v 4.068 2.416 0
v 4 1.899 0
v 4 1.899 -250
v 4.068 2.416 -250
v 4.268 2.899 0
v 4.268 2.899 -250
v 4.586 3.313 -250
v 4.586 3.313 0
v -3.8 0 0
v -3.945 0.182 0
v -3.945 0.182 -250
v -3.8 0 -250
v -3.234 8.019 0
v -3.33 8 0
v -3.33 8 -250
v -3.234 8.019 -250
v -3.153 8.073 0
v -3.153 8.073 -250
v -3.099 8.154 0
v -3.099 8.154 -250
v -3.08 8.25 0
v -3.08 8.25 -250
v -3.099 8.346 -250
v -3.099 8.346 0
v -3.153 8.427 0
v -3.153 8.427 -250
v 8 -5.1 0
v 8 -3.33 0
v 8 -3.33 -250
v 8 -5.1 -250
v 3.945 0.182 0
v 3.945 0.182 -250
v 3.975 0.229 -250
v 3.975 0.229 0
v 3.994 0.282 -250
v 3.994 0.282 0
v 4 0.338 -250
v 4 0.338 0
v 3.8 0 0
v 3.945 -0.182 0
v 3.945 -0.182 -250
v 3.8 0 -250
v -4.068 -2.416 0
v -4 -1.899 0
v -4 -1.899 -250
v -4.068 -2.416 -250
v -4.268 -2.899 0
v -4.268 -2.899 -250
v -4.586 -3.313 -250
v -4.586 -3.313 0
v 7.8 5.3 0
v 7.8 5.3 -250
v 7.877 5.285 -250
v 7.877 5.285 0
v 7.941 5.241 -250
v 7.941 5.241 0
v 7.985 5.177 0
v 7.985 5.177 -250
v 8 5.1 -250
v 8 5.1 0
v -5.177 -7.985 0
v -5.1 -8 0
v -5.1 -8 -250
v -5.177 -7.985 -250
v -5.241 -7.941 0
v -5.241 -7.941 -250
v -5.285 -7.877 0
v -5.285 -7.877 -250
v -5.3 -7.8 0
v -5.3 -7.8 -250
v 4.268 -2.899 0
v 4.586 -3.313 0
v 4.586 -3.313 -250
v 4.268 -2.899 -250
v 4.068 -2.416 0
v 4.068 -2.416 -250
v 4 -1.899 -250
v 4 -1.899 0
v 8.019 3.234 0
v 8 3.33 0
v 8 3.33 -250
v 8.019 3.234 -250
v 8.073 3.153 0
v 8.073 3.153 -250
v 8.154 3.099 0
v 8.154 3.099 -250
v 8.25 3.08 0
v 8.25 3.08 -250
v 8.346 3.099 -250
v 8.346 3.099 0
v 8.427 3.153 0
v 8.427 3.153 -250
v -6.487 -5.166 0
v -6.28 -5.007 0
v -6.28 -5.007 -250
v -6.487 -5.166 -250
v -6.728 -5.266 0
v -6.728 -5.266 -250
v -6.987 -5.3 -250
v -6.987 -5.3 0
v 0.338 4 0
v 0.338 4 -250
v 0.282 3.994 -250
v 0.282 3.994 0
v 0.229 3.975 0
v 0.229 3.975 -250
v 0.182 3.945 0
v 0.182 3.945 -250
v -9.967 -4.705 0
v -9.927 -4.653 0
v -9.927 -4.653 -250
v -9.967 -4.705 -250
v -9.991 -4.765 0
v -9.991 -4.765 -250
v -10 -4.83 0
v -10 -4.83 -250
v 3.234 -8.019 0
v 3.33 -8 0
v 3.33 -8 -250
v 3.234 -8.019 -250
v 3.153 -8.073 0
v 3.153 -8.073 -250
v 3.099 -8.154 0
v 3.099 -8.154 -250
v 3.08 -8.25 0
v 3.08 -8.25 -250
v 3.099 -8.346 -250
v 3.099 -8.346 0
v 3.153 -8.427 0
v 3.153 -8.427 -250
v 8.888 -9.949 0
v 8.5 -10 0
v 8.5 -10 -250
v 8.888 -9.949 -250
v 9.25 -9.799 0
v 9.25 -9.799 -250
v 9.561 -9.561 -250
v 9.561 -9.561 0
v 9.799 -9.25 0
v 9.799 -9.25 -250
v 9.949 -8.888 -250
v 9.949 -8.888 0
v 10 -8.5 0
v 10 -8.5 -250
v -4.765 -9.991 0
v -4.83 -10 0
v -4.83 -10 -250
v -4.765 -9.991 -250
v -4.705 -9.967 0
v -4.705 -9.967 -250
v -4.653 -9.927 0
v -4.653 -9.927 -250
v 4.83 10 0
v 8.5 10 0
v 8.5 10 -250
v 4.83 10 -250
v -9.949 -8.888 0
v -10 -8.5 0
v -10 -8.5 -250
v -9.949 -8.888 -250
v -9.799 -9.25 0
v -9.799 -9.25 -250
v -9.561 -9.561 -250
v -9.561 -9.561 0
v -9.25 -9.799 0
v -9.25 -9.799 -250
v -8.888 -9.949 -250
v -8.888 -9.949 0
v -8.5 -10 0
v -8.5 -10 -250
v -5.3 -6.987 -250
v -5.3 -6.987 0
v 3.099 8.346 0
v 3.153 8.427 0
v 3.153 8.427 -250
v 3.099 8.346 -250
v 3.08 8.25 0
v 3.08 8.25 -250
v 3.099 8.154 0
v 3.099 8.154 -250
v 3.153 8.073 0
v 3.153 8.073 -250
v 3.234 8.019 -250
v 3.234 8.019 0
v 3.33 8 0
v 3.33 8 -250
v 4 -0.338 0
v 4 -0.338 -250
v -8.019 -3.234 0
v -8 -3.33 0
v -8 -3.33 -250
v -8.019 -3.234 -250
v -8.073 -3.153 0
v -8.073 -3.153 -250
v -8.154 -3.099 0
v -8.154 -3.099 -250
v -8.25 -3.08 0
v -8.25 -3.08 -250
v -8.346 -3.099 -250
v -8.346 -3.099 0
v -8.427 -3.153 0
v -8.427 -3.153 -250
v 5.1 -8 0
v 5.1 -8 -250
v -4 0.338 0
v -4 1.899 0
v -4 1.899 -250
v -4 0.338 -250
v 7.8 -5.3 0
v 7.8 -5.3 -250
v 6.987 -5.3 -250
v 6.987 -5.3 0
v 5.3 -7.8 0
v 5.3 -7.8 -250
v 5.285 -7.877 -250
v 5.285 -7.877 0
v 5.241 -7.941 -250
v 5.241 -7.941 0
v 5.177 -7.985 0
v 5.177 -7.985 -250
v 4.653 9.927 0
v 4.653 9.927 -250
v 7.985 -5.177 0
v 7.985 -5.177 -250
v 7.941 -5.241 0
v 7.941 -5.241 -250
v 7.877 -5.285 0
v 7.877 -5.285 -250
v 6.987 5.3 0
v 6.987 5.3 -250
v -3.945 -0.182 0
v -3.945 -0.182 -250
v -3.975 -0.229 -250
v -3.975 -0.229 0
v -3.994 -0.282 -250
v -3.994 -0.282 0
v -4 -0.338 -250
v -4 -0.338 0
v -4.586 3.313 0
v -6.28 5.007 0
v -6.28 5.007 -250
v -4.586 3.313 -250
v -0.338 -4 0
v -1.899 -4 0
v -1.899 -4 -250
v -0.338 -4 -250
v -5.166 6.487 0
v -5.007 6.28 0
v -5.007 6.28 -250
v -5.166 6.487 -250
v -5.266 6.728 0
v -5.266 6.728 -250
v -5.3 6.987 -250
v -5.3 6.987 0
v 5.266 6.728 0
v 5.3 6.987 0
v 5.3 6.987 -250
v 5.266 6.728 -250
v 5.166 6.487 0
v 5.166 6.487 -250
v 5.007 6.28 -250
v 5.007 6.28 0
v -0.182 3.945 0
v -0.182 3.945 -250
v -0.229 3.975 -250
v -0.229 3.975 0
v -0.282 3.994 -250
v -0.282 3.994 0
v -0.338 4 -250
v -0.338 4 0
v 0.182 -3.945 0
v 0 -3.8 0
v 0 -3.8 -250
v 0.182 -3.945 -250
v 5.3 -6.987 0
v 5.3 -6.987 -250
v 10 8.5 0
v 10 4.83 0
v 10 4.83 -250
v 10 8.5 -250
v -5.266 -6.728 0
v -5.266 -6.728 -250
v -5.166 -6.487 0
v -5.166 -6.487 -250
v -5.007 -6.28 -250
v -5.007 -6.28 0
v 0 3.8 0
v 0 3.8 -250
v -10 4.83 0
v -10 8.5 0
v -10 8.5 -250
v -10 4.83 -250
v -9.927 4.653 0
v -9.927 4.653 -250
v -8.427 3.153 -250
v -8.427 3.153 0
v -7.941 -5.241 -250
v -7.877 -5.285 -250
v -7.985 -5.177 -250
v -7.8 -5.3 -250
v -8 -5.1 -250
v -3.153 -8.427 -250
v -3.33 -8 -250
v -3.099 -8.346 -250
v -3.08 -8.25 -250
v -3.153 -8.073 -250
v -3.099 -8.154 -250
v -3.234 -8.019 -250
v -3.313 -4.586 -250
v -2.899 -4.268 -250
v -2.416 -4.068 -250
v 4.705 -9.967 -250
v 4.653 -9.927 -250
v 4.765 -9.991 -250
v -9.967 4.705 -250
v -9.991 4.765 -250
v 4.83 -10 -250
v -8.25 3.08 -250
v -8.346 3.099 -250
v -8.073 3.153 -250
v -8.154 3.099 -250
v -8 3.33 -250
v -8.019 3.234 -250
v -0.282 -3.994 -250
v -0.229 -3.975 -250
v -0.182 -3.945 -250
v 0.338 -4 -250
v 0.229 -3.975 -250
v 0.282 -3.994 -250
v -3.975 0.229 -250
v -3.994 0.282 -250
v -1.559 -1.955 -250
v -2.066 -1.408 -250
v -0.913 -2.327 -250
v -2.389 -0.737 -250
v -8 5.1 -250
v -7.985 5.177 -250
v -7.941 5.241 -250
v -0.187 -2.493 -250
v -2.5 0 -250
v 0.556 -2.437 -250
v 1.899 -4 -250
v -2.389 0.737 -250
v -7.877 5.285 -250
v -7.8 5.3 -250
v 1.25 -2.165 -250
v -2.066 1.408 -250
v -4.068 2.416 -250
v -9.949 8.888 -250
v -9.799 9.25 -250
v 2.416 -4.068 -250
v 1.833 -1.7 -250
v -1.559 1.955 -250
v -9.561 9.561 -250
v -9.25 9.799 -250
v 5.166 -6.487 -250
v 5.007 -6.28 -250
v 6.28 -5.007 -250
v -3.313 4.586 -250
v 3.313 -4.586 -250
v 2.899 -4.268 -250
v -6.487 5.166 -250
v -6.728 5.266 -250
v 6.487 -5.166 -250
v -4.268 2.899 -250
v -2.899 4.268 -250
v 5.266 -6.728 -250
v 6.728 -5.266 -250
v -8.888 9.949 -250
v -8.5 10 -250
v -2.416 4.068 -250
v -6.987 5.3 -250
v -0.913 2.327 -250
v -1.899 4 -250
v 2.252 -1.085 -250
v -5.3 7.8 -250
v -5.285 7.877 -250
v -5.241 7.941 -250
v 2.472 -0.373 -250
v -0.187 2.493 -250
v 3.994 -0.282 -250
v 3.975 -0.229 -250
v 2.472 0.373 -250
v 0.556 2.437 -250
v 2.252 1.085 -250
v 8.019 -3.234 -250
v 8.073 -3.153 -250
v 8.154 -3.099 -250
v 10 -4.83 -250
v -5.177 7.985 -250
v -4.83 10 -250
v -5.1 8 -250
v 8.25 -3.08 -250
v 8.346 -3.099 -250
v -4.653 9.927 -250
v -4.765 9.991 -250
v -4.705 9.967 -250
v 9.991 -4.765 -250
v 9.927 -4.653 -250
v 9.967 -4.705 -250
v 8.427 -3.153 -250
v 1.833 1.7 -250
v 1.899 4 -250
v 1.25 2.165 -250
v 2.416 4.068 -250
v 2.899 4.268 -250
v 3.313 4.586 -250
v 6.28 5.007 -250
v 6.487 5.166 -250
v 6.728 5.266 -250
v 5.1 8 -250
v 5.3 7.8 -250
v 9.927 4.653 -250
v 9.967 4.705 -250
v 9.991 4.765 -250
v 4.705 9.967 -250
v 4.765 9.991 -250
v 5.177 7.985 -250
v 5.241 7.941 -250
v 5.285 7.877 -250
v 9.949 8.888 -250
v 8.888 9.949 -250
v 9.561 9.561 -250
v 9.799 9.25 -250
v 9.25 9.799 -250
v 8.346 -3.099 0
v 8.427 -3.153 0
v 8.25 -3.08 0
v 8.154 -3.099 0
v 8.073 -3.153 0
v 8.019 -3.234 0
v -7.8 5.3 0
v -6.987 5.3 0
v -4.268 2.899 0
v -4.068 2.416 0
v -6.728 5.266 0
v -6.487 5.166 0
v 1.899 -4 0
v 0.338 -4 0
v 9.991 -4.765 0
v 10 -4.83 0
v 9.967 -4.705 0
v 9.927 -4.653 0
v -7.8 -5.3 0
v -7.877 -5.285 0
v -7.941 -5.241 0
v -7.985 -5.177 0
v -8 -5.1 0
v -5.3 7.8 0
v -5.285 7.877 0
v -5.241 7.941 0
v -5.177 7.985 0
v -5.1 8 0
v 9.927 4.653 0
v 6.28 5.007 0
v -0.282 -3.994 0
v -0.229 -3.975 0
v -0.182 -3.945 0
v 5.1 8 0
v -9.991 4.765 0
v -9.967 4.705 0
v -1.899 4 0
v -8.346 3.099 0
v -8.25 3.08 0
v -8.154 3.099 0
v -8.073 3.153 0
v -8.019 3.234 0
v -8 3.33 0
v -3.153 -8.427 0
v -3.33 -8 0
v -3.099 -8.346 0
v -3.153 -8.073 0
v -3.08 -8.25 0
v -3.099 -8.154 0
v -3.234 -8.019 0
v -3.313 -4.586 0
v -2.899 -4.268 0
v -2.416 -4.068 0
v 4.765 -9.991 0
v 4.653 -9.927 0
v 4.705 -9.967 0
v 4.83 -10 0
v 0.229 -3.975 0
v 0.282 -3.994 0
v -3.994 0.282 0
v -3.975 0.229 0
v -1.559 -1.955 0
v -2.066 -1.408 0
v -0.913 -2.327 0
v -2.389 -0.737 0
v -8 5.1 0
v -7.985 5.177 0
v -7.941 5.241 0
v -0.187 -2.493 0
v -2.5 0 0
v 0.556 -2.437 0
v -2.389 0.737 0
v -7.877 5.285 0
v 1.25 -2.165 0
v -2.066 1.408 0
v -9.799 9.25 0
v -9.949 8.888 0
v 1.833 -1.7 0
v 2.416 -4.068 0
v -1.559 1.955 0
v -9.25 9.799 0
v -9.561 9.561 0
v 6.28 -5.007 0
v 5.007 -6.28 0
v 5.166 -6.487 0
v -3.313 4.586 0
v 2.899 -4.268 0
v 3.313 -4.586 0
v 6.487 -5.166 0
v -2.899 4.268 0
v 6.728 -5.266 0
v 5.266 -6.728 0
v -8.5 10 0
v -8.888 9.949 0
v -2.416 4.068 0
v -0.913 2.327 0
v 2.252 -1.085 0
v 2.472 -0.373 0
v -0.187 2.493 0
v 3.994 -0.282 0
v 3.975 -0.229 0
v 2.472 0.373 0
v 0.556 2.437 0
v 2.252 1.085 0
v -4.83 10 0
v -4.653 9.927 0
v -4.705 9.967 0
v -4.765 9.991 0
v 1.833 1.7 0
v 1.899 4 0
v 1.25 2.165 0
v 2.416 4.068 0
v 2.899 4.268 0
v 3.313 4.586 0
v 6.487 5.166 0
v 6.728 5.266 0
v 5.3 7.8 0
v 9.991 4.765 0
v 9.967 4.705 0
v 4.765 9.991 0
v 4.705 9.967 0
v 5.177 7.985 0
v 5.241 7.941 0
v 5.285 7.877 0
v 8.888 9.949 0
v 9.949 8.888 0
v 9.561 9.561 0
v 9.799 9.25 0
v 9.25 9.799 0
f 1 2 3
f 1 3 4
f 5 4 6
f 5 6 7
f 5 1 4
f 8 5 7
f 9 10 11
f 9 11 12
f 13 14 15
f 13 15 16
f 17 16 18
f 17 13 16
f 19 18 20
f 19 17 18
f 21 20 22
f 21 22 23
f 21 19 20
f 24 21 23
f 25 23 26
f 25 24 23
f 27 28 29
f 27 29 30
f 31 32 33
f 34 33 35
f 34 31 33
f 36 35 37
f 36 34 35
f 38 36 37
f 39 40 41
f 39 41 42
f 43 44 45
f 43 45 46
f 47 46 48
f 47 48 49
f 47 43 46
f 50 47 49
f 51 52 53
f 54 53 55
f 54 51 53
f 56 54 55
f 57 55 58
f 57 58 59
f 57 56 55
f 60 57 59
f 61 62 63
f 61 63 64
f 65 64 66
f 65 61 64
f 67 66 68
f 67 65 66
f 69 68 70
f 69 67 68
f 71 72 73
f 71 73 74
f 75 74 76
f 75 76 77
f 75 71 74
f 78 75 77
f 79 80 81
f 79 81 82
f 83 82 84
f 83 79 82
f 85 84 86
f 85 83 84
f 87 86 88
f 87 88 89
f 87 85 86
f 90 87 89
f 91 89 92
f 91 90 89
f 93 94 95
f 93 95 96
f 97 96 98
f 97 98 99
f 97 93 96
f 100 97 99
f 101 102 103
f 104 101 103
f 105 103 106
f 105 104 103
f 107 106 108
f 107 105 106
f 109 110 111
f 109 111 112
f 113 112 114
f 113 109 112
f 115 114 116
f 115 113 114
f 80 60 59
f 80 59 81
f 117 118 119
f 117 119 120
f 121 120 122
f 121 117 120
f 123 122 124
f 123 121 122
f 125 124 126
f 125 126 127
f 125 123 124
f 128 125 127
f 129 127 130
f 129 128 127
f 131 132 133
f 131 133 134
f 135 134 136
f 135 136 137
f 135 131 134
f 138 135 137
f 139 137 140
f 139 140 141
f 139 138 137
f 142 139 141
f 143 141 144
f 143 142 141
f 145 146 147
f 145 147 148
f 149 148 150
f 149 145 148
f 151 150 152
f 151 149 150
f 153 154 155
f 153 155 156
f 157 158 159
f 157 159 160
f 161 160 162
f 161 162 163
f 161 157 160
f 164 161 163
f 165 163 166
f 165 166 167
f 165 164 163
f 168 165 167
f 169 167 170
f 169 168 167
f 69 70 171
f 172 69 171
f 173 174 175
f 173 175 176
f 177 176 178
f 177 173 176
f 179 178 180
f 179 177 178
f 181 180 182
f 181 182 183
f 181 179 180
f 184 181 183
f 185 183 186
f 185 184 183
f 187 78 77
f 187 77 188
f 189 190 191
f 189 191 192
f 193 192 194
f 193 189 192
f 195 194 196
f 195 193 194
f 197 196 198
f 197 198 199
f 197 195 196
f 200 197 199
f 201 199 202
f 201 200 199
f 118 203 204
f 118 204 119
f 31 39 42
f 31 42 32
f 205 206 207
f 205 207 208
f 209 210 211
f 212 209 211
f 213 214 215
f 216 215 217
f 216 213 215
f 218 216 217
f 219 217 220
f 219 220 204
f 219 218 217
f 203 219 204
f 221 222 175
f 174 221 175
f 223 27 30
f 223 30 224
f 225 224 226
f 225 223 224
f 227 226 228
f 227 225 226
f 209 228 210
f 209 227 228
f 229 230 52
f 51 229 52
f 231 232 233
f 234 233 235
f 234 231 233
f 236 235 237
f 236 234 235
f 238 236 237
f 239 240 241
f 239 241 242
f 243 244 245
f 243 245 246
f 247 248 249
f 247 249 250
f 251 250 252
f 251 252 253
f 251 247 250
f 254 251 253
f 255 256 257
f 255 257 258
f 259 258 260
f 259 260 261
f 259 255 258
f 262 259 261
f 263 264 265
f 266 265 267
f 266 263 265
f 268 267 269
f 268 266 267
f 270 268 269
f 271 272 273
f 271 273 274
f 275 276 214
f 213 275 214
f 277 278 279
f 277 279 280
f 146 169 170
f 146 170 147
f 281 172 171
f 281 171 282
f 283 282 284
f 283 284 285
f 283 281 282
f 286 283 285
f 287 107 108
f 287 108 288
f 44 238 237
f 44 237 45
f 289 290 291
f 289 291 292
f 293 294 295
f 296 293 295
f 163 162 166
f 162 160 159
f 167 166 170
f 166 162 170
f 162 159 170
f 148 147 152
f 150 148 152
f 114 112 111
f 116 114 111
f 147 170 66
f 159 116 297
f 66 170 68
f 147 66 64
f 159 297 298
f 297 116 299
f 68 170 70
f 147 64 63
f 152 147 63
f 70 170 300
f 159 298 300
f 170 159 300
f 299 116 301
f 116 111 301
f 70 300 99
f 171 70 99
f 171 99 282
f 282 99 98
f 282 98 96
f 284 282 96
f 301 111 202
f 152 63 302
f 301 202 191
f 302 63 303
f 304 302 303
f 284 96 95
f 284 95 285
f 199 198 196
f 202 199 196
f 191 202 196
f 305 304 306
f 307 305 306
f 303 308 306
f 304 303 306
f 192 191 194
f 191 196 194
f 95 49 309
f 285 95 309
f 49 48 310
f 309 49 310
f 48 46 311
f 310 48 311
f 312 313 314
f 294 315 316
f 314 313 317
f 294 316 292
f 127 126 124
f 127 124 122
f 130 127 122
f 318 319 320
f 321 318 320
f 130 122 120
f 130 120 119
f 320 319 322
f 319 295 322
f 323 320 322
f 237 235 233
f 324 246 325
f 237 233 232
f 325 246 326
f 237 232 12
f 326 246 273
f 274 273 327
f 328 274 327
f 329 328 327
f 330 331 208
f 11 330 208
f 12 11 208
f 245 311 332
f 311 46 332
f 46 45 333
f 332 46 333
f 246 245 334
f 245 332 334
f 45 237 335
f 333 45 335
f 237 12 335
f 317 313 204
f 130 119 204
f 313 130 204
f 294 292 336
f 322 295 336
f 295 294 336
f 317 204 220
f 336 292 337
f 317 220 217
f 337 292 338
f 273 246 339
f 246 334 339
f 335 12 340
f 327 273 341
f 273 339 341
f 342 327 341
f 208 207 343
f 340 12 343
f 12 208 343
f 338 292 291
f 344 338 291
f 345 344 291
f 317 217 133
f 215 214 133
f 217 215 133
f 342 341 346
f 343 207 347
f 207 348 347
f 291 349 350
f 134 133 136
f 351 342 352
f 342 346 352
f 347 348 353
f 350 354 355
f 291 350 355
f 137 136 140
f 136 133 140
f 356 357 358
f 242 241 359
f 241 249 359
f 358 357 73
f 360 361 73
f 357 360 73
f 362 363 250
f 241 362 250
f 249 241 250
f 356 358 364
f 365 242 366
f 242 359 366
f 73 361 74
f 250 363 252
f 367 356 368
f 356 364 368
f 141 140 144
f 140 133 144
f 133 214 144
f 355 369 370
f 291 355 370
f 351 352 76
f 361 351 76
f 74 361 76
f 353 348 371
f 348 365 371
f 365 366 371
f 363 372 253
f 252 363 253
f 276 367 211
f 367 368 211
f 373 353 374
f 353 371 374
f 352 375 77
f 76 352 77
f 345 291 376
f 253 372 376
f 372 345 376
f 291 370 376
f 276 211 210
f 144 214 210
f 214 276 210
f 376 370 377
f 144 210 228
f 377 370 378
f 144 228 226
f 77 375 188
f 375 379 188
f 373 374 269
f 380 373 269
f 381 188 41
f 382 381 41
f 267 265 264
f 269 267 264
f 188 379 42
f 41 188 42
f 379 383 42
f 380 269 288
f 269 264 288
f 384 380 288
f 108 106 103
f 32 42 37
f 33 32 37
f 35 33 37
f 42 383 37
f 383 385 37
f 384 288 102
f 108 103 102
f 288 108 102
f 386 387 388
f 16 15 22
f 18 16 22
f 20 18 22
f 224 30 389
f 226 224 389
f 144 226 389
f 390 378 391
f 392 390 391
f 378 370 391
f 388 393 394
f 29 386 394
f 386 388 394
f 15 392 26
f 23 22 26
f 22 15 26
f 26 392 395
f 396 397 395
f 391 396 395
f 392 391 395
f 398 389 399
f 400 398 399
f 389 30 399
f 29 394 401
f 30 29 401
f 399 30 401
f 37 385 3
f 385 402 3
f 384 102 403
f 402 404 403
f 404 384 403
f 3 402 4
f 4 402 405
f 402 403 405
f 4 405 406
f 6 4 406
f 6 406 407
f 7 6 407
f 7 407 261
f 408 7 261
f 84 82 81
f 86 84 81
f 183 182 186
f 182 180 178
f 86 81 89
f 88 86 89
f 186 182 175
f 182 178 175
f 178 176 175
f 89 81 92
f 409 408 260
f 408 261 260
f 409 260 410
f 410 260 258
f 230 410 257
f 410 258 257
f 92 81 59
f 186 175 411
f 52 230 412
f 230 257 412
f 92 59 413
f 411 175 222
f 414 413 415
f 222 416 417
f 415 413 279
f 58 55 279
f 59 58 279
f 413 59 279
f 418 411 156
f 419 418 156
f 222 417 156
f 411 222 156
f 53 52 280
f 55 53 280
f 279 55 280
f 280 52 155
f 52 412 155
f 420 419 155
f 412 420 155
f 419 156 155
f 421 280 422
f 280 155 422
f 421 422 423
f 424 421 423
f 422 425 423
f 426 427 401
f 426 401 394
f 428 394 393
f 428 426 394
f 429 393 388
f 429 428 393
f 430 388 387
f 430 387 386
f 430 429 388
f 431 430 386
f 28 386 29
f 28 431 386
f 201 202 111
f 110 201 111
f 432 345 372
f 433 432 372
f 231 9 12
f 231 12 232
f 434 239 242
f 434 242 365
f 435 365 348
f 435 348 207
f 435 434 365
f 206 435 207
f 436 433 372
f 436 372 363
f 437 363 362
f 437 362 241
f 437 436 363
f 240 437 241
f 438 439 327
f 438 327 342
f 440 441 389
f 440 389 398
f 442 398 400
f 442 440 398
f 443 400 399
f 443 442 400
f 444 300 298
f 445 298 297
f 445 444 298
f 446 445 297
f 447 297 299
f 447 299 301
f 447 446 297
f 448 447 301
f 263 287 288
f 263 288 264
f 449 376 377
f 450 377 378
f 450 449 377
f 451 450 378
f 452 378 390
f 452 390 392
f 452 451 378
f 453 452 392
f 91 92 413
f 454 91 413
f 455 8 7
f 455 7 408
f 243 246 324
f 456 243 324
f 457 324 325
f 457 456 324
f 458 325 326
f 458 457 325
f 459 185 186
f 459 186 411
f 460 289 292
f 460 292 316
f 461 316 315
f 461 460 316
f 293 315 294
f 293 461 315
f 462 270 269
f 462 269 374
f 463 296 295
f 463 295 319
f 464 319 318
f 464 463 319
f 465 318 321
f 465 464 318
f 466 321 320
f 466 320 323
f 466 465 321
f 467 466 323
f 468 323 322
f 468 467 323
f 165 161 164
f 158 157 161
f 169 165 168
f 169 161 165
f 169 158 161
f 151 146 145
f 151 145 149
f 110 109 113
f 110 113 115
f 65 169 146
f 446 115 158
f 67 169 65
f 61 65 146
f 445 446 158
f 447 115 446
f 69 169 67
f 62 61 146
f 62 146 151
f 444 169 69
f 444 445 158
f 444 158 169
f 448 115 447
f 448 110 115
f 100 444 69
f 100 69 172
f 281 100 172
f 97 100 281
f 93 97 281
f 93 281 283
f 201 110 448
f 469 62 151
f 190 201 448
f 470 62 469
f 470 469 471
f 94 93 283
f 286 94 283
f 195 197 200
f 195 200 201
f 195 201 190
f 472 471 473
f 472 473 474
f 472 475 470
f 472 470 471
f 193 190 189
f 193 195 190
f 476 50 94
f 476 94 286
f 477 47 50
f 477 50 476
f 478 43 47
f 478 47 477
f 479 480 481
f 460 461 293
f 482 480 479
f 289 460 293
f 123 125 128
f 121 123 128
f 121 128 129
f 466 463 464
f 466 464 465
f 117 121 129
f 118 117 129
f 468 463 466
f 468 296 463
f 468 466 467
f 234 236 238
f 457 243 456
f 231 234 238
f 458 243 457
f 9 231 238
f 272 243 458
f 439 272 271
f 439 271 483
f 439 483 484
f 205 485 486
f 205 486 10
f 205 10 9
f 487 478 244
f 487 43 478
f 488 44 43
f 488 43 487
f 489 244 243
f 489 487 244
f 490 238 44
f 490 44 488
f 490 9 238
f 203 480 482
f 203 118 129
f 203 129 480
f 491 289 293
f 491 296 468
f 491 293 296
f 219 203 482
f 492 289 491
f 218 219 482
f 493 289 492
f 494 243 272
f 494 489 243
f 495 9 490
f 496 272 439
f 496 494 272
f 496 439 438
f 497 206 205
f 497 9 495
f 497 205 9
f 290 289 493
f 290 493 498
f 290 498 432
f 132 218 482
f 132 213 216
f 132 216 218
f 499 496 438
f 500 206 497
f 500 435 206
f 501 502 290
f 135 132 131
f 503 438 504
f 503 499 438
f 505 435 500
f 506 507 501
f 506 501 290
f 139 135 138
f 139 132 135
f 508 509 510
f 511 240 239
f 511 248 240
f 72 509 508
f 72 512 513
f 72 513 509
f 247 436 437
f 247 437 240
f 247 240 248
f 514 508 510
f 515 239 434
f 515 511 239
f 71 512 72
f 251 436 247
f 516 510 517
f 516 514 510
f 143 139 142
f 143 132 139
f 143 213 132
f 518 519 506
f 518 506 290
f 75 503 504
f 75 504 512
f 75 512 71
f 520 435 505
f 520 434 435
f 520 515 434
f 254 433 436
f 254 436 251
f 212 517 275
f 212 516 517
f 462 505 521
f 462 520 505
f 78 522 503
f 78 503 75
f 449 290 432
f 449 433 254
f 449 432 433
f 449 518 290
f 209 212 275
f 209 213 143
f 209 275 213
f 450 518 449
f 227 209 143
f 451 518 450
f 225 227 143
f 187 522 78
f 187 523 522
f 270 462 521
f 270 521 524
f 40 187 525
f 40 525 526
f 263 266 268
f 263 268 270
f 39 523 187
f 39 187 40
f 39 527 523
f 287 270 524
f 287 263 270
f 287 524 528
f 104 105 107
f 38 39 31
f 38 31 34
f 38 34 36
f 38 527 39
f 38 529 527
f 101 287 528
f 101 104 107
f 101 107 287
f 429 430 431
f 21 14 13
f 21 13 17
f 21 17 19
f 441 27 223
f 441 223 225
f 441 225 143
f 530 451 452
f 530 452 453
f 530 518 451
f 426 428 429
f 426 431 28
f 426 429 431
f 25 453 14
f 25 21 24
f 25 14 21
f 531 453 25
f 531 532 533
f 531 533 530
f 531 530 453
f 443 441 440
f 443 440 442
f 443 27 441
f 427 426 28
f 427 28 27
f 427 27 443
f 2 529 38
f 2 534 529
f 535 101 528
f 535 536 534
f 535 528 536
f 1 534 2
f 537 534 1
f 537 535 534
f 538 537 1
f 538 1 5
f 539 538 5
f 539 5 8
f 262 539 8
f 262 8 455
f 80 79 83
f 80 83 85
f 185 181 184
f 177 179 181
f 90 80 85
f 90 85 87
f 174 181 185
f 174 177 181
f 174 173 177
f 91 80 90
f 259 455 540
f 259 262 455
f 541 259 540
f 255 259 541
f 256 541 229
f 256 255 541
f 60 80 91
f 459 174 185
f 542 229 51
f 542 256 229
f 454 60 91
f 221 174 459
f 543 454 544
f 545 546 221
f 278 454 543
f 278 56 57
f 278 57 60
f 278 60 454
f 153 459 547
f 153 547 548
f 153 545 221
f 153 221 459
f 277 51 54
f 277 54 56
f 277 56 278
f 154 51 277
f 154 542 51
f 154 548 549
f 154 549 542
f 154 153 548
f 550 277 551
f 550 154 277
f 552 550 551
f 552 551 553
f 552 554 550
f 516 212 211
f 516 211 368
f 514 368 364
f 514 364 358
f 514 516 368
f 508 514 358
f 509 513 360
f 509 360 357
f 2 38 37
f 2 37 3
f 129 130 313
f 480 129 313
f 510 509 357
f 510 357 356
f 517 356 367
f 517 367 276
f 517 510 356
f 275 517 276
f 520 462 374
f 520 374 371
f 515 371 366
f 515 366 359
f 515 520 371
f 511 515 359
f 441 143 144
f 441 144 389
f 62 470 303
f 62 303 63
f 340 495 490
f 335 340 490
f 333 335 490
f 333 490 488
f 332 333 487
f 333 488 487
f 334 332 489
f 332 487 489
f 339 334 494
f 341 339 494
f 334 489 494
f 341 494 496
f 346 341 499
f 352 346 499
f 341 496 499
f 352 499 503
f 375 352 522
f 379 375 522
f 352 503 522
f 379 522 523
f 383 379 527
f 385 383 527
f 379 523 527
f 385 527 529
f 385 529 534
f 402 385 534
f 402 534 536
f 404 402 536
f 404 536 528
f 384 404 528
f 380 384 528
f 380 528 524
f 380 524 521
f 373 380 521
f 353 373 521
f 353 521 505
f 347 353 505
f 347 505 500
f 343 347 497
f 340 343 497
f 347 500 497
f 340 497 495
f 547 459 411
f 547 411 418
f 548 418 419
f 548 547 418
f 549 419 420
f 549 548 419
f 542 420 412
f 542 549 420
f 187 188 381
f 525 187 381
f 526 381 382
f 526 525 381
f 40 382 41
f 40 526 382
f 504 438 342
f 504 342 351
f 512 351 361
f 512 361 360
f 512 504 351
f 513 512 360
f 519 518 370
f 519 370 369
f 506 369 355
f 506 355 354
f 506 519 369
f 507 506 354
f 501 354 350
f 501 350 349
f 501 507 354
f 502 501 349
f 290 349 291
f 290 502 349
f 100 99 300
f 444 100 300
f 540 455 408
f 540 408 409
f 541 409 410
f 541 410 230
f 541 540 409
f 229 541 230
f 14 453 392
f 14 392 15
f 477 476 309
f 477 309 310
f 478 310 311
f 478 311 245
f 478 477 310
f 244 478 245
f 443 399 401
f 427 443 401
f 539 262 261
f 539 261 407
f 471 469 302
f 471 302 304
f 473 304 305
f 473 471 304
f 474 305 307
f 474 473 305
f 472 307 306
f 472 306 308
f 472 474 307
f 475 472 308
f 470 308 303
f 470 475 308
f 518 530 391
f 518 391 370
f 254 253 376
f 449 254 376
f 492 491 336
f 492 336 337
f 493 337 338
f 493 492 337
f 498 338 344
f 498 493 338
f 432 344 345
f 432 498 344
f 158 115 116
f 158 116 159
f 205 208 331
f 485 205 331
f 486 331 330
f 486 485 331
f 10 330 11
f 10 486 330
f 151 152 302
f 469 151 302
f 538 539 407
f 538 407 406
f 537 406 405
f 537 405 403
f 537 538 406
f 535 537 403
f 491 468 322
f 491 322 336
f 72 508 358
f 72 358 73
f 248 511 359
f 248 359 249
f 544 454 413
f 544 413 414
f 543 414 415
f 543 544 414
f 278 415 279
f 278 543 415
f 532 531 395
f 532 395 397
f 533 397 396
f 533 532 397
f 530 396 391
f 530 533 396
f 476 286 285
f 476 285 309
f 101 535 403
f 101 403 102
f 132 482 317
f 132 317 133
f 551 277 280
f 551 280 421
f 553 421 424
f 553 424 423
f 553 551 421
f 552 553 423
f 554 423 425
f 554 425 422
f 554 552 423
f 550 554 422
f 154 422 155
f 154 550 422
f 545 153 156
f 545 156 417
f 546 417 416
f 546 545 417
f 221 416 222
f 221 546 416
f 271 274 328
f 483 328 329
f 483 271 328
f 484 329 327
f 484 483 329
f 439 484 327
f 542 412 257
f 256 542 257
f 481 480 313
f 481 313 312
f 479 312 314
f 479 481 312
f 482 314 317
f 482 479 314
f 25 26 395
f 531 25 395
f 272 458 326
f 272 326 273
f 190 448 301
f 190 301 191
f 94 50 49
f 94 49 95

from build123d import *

# Parameters (mm, degrees)
SKETCH_181_R      = 2.5
EXTRUDE_724_DEPTH = 250


with BuildPart() as part:
    # Sketch 181 → Extrude 724 (new body)
    with BuildSketch(Plane.XY):
        with BuildLine():
            Line((-4, 1.898780669), (-4, 0.337695265))
            ThreePointArc((-4, 0.337695265), (-3.98590708, 0.254943529), (-3.945217202, 0.181521503))
            Line((-3.945217202, 0.181521503), (-3.8, 0))
            Line((-3.8, 0), (-3.945217202, -0.181521503))
            ThreePointArc((-3.945217202, -0.181521503), (-3.98590708, -0.254943529), (-4, -0.337695265))
            Line((-4, -0.337695265), (-4, -1.898780669))
            ThreePointArc((-4, -1.898780669), (-4.152240935, -2.664147534), (-4.585786438, -3.312994231))
            Line((-4.585786438, -3.312994231), (-6.279898987, -5.007106781))
            ThreePointArc((-6.279898987, -5.007106781), (-6.604322336, -5.223879533), (-6.987005769, -5.3))
            Line((-6.987005769, -5.3), (-7.8, -5.3))
            ThreePointArc((-7.8, -5.3), (-7.941421356, -5.241421356), (-8, -5.1))
            Line((-8, -5.1), (-8, -3.33))
            ThreePointArc((-8, -3.33), (-8.154329142, -3.099030117), (-8.426776695, -3.153223305))
            Line((-8.426776695, -3.153223305), (-9.926776695, -4.653223305))
            ThreePointArc((-9.926776695, -4.653223305), (-9.980969883, -4.734329142), (-10, -4.83))
            Line((-10, -4.83), (-10, -8.5))
            ThreePointArc((-10, -8.5), (-9.560660172, -9.560660172), (-8.5, -10))
            Line((-8.5, -10), (-4.83, -10))
            ThreePointArc((-4.83, -10), (-4.734329142, -9.980969883), (-4.653223305, -9.926776695))
            Line((-4.653223305, -9.926776695), (-3.153223305, -8.426776695))
            ThreePointArc((-3.153223305, -8.426776695), (-3.099030117, -8.154329142), (-3.33, -8))
            Line((-3.33, -8), (-5.1, -8))
            ThreePointArc((-5.1, -8), (-5.241421356, -7.941421356), (-5.3, -7.8))
            Line((-5.3, -7.8), (-5.3, -6.987005769))
            ThreePointArc((-5.3, -6.987005769), (-5.223879533, -6.604322336), (-5.007106781, -6.279898987))
            Line((-5.007106781, -6.279898987), (-3.312994231, -4.585786438))
            ThreePointArc((-3.312994231, -4.585786438), (-2.664147534, -4.152240935), (-1.898780669, -4))
            Line((-1.898780669, -4), (-0.337695265, -4))
            ThreePointArc((-0.337695265, -4), (-0.254943529, -3.98590708), (-0.181521503, -3.945217202))
            Line((-0.181521503, -3.945217202), (0, -3.8))
            Line((0, -3.8), (0.181521503, -3.945217202))
            ThreePointArc((0.181521503, -3.945217202), (0.254943529, -3.98590708), (0.337695265, -4))
            Line((0.337695265, -4), (1.898780669, -4))
            ThreePointArc((1.898780669, -4), (2.664147534, -4.152240935), (3.312994231, -4.585786438))
            Line((3.312994231, -4.585786438), (5.007106781, -6.279898987))
            ThreePointArc((5.007106781, -6.279898987), (5.223879533, -6.604322336), (5.3, -6.987005769))
            Line((5.3, -6.987005769), (5.3, -7.8))
            ThreePointArc((5.3, -7.8), (5.241421356, -7.941421356), (5.1, -8))
            Line((5.1, -8), (3.33, -8))
            ThreePointArc((3.33, -8), (3.099030117, -8.154329142), (3.153223305, -8.426776695))
            Line((3.153223305, -8.426776695), (4.653223305, -9.926776695))
            ThreePointArc((4.653223305, -9.926776695), (4.734329142, -9.980969883), (4.83, -10))
            Line((4.83, -10), (8.5, -10))
            ThreePointArc((8.5, -10), (9.560660172, -9.560660172), (10, -8.5))
            Line((10, -8.5), (10, -4.83))
            ThreePointArc((10, -4.83), (9.980969883, -4.734329142), (9.926776695, -4.653223305))
            Line((9.926776695, -4.653223305), (8.426776695, -3.153223305))
            ThreePointArc((8.426776695, -3.153223305), (8.154329142, -3.099030117), (8, -3.33))
            Line((8, -3.33), (8, -5.1))
            ThreePointArc((8, -5.1), (7.941421356, -5.241421356), (7.8, -5.3))
            Line((7.8, -5.3), (6.987005769, -5.3))
            ThreePointArc((6.987005769, -5.3), (6.604322336, -5.223879533), (6.279898987, -5.007106781))
            Line((6.279898987, -5.007106781), (4.585786438, -3.312994231))
            ThreePointArc((4.585786438, -3.312994231), (4.152240935, -2.664147534), (4, -1.898780669))
            Line((4, -1.898780669), (4, -0.337695265))
            ThreePointArc((4, -0.337695265), (3.98590708, -0.254943529), (3.945217202, -0.181521503))
            Line((3.945217202, -0.181521503), (3.8, 0))
            Line((3.8, 0), (3.945217202, 0.181521503))
            ThreePointArc((3.945217202, 0.181521503), (3.98590708, 0.254943529), (4, 0.337695265))
            Line((4, 0.337695265), (4, 1.898780669))
            ThreePointArc((4, 1.898780669), (4.152240935, 2.664147534), (4.585786438, 3.312994231))
            Line((4.585786438, 3.312994231), (6.279898987, 5.007106781))
            ThreePointArc((6.279898987, 5.007106781), (6.604322336, 5.223879533), (6.987005769, 5.3))
            Line((6.987005769, 5.3), (7.8, 5.3))
            ThreePointArc((7.8, 5.3), (7.941421356, 5.241421356), (8, 5.1))
            Line((8, 5.1), (8, 3.33))
            ThreePointArc((8, 3.33), (8.154329142, 3.099030117), (8.426776695, 3.153223305))
            Line((8.426776695, 3.153223305), (9.926776695, 4.653223305))
            ThreePointArc((9.926776695, 4.653223305), (9.980969883, 4.734329142), (10, 4.83))
            Line((10, 4.83), (10, 8.5))
            ThreePointArc((10, 8.5), (9.560660172, 9.560660172), (8.5, 10))
            Line((8.5, 10), (4.83, 10))
            ThreePointArc((4.83, 10), (4.734329142, 9.980969883), (4.653223305, 9.926776695))
            Line((4.653223305, 9.926776695), (3.153223305, 8.426776695))
            ThreePointArc((3.153223305, 8.426776695), (3.099030117, 8.154329142), (3.33, 8))
            Line((3.33, 8), (5.1, 8))
            ThreePointArc((5.1, 8), (5.241421356, 7.941421356), (5.3, 7.8))
            Line((5.3, 7.8), (5.3, 6.987005769))
            ThreePointArc((5.3, 6.987005769), (5.223879533, 6.604322336), (5.007106781, 6.279898987))
            Line((5.007106781, 6.279898987), (3.312994231, 4.585786438))
            ThreePointArc((3.312994231, 4.585786438), (2.664147534, 4.152240935), (1.898780669, 4))
            Line((1.898780669, 4), (0.337695265, 4))
            ThreePointArc((0.337695265, 4), (0.254943529, 3.98590708), (0.181521503, 3.945217202))
            Line((0.181521503, 3.945217202), (0, 3.8))
            Line((0, 3.8), (-0.181521503, 3.945217202))
            ThreePointArc((-0.181521503, 3.945217202), (-0.254943529, 3.98590708), (-0.337695265, 4))
            Line((-0.337695265, 4), (-1.898780669, 4))
            ThreePointArc((-1.898780669, 4), (-2.664147534, 4.152240935), (-3.312994231, 4.585786438))
            Line((-3.312994231, 4.585786438), (-5.007106781, 6.279898987))
            ThreePointArc((-5.007106781, 6.279898987), (-5.223879533, 6.604322336), (-5.3, 6.987005769))
            Line((-5.3, 6.987005769), (-5.3, 7.8))
            ThreePointArc((-5.3, 7.8), (-5.241421356, 7.941421356), (-5.1, 8))
            Line((-5.1, 8), (-3.33, 8))
            ThreePointArc((-3.33, 8), (-3.099030117, 8.154329142), (-3.153223305, 8.426776695))
            Line((-3.153223305, 8.426776695), (-4.653223305, 9.926776695))
            ThreePointArc((-4.653223305, 9.926776695), (-4.734329142, 9.980969883), (-4.83, 10))
            Line((-4.83, 10), (-8.5, 10))
            ThreePointArc((-8.5, 10), (-9.560660172, 9.560660172), (-10, 8.5))
            Line((-10, 8.5), (-10, 4.83))
            ThreePointArc((-10, 4.83), (-9.980969883, 4.734329142), (-9.926776695, 4.653223305))
            Line((-9.926776695, 4.653223305), (-8.426776695, 3.153223305))
            ThreePointArc((-8.426776695, 3.153223305), (-8.154329142, 3.099030117), (-8, 3.33))
            Line((-8, 3.33), (-8, 5.1))
            ThreePointArc((-8, 5.1), (-7.941421356, 5.241421356), (-7.8, 5.3))
            Line((-7.8, 5.3), (-6.987005769, 5.3))
            ThreePointArc((-6.987005769, 5.3), (-6.604322336, 5.223879533), (-6.279898987, 5.007106781))
            Line((-6.279898987, 5.007106781), (-4.585786438, 3.312994231))
            ThreePointArc((-4.585786438, 3.312994231), (-4.152240935, 2.664147534), (-4, 1.898780669))
        make_face()
        with Locations(Location((0, 0, 0), (0, 0, 180))):
            Circle(SKETCH_181_R, mode=Mode.SUBTRACT)
    extrude(amount=-EXTRUDE_724_DEPTH)


solid = part.part
